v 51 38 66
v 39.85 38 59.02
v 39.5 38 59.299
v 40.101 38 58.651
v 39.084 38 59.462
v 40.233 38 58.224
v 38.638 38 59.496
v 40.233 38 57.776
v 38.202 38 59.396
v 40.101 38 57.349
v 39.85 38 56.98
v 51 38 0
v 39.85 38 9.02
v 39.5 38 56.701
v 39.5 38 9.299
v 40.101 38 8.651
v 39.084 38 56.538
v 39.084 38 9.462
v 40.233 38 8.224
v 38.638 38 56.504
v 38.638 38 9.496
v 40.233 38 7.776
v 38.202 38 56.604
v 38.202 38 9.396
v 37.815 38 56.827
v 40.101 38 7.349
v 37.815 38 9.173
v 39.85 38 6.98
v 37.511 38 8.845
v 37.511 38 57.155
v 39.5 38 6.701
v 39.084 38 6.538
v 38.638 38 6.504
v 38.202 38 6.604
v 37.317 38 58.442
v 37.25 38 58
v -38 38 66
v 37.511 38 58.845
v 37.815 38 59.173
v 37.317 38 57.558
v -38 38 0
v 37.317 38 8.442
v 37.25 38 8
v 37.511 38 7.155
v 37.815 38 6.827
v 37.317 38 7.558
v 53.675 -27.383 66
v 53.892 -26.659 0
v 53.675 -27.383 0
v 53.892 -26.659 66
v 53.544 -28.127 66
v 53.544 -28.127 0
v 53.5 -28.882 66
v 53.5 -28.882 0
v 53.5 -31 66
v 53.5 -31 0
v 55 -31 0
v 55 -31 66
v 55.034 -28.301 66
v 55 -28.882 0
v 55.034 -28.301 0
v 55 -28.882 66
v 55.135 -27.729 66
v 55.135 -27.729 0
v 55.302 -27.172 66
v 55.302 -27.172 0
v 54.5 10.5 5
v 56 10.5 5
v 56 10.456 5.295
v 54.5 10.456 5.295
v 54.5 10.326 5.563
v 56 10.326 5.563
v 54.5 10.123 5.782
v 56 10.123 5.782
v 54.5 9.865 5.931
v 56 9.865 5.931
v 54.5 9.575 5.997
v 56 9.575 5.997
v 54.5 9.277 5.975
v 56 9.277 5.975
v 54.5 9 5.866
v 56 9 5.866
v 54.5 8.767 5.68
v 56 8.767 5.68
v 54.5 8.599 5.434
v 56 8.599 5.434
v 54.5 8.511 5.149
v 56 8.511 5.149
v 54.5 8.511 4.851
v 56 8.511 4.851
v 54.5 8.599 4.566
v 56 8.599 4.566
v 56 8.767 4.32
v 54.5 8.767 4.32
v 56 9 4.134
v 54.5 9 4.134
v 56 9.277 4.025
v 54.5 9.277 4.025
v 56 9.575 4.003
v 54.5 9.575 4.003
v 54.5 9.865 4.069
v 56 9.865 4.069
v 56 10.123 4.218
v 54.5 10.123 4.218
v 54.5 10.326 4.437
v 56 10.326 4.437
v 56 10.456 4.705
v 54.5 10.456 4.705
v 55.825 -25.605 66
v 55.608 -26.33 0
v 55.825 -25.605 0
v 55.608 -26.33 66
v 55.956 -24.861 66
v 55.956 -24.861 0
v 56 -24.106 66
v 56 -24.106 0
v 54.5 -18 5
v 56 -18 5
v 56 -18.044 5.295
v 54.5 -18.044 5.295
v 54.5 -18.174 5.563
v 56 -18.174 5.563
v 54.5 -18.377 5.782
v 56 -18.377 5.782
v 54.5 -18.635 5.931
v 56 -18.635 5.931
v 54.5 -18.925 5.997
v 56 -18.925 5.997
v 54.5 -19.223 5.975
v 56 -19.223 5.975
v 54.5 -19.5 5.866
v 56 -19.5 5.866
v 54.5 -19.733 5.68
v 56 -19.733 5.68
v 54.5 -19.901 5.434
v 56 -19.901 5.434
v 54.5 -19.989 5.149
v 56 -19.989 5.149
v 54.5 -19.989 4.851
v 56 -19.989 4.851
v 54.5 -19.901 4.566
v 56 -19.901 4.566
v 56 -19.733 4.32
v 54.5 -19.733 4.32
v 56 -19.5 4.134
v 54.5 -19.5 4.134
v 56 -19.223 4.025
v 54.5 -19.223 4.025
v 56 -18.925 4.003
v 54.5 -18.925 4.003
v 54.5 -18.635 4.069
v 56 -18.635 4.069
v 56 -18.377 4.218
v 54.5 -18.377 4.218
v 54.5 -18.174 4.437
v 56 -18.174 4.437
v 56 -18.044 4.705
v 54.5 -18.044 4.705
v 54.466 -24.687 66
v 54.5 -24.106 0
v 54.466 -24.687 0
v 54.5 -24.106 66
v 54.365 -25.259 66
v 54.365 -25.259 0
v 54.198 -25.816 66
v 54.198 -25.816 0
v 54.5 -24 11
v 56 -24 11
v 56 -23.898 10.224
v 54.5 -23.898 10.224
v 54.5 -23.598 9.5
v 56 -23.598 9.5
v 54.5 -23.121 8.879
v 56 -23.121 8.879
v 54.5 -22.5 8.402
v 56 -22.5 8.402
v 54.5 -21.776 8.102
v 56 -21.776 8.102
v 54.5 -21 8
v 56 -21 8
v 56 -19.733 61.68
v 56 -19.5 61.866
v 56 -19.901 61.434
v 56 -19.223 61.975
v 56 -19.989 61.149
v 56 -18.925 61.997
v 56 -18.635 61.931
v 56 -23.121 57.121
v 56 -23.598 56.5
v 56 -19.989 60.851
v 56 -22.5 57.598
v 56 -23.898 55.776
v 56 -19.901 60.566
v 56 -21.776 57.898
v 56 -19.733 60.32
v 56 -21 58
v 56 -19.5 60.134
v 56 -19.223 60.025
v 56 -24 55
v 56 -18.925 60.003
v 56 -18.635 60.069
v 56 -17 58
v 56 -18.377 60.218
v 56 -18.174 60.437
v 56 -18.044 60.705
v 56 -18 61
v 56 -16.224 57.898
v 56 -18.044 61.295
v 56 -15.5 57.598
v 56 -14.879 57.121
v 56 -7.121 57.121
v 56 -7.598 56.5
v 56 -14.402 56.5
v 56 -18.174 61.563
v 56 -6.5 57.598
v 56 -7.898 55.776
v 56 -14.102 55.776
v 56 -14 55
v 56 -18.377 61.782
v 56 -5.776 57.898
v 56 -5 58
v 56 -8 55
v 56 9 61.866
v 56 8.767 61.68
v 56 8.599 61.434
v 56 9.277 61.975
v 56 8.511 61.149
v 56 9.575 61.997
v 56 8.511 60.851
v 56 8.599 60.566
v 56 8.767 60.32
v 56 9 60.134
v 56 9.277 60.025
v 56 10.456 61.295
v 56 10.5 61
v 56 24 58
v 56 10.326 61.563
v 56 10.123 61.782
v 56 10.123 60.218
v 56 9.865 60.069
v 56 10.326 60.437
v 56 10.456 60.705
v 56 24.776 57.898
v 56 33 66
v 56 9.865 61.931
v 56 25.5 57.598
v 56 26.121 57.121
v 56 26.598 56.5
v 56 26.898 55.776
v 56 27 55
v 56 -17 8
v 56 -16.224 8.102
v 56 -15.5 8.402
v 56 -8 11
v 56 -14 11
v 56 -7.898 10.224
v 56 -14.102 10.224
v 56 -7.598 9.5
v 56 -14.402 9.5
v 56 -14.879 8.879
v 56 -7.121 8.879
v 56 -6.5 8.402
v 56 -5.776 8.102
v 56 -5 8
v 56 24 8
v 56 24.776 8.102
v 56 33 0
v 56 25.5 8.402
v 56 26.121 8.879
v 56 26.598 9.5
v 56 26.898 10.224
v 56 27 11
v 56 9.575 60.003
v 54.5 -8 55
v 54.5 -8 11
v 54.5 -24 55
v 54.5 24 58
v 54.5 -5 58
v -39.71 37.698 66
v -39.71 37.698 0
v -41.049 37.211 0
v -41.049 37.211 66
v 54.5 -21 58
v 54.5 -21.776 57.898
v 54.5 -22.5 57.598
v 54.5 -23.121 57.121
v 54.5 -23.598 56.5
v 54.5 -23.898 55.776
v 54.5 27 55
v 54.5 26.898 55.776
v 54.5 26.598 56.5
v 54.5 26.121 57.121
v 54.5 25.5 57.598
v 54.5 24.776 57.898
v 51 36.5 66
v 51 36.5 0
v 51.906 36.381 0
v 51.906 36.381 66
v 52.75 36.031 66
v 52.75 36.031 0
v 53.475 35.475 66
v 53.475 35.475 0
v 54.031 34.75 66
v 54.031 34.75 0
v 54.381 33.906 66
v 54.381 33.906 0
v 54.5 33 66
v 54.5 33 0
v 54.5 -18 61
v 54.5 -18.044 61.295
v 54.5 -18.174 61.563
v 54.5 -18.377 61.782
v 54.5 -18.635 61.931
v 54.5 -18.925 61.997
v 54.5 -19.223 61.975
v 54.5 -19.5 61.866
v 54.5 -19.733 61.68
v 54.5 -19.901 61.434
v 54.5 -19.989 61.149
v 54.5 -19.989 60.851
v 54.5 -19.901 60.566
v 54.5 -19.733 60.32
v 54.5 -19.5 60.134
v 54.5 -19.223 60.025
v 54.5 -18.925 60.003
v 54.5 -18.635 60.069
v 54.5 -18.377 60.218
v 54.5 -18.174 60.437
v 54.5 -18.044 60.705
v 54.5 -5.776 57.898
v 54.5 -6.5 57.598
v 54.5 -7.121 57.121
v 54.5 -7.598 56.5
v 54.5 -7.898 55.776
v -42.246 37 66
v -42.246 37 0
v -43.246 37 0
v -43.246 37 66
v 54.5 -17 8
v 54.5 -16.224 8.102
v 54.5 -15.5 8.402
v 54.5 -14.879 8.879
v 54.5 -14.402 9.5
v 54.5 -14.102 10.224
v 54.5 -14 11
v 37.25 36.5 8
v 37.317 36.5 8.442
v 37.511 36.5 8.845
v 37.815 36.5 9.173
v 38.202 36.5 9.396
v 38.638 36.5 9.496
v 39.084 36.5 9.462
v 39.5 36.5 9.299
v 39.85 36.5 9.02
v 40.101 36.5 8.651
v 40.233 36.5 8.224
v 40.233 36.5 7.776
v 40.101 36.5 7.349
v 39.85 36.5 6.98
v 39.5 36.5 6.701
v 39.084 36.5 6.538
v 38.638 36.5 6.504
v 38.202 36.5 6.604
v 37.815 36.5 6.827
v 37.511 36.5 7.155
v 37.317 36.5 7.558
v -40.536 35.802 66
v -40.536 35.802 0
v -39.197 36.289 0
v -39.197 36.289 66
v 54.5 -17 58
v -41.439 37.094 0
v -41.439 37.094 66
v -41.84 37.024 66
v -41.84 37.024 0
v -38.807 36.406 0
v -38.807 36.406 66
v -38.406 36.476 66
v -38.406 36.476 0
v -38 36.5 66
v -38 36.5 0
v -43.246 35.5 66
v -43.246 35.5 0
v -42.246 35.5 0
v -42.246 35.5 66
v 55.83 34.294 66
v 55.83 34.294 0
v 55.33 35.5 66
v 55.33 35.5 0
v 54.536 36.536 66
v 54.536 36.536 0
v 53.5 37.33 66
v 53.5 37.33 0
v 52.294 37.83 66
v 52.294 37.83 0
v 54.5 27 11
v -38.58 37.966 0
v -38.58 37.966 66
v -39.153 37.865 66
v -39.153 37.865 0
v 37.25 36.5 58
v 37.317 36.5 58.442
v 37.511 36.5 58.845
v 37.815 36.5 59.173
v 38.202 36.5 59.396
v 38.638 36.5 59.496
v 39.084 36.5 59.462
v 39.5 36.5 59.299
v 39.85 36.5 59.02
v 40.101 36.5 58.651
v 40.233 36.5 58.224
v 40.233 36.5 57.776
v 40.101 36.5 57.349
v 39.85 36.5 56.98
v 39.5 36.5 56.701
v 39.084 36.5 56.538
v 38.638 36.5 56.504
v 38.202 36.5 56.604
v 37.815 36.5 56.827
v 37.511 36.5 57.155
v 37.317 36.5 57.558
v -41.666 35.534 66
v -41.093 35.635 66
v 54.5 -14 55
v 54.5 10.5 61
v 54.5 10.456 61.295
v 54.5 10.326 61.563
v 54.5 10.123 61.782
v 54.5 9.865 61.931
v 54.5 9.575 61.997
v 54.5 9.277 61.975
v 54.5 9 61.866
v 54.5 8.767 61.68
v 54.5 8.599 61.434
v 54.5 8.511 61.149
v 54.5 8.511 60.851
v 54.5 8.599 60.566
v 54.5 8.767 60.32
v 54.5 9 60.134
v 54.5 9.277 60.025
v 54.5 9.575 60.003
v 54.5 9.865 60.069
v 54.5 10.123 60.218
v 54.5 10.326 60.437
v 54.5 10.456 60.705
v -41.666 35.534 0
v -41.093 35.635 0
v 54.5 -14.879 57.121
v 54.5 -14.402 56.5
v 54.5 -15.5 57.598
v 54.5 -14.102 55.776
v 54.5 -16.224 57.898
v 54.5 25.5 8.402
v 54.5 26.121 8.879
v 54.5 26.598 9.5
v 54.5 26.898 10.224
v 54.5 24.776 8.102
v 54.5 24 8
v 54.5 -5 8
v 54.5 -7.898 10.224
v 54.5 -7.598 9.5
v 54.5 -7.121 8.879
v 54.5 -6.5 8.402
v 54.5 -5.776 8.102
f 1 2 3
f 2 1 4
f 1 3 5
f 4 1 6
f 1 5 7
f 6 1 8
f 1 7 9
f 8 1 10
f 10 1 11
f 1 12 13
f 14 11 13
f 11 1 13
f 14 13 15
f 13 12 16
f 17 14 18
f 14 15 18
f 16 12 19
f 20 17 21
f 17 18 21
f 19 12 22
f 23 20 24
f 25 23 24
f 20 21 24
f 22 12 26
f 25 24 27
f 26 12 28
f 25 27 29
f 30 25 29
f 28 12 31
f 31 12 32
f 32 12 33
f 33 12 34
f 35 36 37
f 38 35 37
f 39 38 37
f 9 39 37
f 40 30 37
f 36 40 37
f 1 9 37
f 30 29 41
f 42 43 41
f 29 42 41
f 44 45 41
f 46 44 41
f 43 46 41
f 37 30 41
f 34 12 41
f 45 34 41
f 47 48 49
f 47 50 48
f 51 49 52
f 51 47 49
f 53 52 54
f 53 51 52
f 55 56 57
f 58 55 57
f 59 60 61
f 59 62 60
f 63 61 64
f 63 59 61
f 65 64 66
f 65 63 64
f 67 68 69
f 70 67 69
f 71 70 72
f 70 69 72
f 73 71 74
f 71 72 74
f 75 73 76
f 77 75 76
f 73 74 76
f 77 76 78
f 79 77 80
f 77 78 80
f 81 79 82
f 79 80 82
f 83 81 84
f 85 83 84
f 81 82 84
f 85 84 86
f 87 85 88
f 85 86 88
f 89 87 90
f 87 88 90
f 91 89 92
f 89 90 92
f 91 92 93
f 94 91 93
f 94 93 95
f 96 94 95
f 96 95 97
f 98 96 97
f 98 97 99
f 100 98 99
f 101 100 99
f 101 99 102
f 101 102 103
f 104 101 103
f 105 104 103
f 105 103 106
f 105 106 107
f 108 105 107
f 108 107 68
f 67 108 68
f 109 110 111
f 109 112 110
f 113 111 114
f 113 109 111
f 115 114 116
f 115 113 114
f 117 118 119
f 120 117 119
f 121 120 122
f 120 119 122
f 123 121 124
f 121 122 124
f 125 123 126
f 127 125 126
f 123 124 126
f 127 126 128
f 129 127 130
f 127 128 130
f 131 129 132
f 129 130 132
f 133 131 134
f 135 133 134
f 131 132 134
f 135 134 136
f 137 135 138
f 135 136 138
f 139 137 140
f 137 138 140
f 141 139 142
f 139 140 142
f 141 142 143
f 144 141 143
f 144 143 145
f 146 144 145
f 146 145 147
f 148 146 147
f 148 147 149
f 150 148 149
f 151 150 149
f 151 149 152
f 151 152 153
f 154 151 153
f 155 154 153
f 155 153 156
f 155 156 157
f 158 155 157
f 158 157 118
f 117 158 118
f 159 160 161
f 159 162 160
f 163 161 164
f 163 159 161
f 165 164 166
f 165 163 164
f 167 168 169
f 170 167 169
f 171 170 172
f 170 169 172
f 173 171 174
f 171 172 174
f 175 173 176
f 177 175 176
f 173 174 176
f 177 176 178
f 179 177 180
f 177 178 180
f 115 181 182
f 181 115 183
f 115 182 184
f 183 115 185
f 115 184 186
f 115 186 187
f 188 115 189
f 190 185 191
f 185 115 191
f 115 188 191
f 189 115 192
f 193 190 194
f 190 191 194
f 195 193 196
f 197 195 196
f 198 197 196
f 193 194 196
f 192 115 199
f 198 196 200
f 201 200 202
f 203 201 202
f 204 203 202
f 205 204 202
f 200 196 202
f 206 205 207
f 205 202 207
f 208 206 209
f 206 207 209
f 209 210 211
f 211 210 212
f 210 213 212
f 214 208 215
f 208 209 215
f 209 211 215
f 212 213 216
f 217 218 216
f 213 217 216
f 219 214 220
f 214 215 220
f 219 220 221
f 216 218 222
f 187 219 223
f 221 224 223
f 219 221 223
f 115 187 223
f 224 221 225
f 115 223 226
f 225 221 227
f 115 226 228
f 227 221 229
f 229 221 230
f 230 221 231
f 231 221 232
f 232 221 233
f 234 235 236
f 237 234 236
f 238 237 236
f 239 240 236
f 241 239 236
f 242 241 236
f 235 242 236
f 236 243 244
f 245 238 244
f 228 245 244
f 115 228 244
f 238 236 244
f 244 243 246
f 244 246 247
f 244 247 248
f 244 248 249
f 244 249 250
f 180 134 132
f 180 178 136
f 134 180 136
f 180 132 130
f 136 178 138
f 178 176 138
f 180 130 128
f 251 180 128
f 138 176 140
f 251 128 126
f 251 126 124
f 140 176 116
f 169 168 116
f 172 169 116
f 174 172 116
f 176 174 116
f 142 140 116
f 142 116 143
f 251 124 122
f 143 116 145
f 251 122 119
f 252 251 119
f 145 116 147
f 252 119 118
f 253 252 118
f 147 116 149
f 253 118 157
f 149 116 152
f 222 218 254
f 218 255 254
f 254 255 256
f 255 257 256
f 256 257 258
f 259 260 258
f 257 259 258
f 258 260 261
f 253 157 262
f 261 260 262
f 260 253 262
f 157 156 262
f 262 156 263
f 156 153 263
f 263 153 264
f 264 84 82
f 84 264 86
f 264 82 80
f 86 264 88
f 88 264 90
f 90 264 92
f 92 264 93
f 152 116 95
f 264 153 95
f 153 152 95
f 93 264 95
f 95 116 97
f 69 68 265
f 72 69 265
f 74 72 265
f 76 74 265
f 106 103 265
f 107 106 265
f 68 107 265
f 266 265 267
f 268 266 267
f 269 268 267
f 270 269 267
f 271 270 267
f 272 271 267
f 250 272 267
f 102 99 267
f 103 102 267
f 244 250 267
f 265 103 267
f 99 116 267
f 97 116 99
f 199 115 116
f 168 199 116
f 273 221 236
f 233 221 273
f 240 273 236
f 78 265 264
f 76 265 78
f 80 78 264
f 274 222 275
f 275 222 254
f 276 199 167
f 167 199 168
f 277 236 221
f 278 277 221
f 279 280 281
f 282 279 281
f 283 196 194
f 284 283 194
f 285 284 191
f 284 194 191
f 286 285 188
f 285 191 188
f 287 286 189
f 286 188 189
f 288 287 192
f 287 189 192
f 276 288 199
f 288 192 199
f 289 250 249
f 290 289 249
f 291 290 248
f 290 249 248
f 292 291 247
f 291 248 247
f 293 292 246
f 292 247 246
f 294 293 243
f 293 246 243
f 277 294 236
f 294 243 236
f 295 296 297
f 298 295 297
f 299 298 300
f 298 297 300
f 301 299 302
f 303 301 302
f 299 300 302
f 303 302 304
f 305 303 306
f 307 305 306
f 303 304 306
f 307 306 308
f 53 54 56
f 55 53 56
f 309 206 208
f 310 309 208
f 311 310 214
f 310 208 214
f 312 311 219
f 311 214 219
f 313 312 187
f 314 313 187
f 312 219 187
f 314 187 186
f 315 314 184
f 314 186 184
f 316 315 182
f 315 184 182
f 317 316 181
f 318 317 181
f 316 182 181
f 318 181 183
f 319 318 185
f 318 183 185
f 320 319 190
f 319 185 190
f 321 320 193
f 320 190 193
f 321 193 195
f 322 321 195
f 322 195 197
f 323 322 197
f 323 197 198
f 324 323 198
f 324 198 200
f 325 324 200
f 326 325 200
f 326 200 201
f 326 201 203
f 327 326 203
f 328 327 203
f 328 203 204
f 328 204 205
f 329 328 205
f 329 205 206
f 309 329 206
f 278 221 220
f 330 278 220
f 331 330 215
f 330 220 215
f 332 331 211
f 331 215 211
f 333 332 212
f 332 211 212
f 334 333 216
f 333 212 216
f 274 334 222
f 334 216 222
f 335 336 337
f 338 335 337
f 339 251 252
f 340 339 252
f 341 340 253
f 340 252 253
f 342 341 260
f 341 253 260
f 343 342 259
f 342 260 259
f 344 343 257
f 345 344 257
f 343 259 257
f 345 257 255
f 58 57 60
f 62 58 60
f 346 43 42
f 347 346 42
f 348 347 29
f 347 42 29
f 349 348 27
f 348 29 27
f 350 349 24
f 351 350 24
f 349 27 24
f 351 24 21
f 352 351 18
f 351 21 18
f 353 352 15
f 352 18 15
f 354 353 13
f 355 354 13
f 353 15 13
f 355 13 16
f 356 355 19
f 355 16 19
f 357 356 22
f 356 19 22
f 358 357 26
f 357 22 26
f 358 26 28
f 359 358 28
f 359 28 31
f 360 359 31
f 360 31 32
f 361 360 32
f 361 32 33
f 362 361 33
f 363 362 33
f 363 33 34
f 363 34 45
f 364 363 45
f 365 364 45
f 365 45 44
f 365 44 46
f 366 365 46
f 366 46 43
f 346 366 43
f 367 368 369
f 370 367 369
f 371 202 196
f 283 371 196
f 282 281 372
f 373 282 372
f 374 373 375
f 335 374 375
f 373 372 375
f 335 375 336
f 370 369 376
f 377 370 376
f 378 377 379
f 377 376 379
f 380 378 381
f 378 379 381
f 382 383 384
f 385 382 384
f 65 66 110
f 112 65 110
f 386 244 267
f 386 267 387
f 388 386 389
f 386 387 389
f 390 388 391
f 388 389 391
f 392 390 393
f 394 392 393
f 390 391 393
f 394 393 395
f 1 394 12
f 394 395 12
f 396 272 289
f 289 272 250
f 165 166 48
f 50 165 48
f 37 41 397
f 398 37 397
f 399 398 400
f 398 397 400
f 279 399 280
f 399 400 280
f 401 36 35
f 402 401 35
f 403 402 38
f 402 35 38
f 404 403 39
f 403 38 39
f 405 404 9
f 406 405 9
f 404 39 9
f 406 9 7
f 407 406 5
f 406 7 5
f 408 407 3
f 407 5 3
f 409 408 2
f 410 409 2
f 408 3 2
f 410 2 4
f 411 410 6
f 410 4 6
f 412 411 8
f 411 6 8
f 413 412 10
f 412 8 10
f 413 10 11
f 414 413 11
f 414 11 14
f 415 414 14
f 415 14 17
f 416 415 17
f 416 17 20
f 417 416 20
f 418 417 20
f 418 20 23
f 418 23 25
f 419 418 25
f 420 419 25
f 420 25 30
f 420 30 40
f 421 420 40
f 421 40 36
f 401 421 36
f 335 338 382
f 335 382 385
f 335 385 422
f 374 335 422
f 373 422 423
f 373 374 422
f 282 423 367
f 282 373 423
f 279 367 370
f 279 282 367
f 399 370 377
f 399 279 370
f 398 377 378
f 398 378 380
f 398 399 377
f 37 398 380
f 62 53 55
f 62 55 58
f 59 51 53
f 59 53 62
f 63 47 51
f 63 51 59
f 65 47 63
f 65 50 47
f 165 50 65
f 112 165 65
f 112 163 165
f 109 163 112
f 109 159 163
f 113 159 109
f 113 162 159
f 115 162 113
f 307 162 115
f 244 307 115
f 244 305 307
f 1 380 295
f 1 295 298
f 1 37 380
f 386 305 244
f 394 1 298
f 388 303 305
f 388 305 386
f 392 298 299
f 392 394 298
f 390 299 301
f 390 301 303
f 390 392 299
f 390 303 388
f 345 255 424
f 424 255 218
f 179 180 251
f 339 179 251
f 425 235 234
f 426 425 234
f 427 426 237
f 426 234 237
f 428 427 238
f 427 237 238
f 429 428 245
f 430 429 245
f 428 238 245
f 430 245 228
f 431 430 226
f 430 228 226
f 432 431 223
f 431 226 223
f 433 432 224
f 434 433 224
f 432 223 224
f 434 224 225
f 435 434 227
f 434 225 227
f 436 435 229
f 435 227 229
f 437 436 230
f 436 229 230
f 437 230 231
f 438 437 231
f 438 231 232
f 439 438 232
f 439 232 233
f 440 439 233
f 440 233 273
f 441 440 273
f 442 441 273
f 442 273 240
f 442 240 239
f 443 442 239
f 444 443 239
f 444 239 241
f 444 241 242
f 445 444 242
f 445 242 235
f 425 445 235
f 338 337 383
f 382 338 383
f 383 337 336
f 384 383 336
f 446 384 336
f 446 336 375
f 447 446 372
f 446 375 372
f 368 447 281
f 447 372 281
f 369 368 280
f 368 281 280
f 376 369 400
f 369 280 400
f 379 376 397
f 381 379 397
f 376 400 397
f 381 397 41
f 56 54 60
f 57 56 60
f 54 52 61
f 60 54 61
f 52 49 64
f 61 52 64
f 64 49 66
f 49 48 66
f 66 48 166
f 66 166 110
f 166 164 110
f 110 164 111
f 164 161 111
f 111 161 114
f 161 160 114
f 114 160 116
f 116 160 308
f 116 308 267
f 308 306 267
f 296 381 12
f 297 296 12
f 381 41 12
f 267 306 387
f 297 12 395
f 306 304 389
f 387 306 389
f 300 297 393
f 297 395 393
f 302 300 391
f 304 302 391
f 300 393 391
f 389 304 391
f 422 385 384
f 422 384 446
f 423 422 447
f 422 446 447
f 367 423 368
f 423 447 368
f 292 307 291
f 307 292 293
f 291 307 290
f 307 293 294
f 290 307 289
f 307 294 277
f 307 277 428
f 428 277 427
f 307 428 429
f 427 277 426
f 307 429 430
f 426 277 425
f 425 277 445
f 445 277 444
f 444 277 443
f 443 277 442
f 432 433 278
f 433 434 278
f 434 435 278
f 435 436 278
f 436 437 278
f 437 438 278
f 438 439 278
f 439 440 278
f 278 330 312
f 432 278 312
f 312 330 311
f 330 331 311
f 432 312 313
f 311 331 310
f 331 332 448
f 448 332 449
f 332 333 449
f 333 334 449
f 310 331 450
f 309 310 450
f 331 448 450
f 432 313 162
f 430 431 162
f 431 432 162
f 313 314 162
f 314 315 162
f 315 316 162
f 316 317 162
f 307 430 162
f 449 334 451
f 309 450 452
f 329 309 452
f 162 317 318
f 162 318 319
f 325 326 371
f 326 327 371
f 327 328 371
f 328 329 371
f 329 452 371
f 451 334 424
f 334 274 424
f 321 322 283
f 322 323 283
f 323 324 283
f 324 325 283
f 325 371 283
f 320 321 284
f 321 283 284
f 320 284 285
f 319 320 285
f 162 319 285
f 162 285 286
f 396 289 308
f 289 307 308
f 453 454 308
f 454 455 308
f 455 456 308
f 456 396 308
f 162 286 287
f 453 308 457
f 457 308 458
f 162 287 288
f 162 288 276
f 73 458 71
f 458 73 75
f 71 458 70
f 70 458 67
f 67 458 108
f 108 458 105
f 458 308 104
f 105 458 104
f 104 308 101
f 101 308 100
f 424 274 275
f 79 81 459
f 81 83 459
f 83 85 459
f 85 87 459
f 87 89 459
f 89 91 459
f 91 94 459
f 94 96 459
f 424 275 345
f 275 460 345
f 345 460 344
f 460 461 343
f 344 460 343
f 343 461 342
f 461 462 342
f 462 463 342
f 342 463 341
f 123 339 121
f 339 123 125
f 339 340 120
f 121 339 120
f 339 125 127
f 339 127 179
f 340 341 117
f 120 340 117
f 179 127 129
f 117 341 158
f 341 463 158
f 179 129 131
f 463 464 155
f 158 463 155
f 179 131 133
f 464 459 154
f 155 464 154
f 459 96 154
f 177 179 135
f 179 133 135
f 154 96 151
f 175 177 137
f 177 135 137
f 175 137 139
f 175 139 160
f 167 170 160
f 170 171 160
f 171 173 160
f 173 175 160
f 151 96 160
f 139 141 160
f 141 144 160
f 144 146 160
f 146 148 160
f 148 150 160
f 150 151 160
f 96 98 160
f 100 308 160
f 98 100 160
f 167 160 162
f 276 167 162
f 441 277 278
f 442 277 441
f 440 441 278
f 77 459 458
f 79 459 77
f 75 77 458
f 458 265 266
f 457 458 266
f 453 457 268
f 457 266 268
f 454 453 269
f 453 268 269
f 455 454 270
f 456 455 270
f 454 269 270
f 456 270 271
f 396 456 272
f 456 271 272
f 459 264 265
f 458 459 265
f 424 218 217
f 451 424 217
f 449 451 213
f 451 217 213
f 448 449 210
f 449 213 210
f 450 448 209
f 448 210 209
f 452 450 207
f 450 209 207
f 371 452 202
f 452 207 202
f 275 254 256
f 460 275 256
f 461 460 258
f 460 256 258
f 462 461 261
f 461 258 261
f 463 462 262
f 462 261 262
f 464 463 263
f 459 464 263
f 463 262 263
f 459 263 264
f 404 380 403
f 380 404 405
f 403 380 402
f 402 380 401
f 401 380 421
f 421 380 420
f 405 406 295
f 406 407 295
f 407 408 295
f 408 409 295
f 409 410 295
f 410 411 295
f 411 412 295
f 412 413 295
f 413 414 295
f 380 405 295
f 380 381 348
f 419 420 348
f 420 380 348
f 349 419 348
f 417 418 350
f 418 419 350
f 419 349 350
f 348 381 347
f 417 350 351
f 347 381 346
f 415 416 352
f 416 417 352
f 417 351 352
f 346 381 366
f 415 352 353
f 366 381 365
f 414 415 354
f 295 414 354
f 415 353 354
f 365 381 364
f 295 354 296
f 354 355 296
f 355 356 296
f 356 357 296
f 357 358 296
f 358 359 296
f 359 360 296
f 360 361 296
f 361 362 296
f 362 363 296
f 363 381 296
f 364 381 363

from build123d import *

# Parameters (mm, degrees)
F1_DEPTH  = 66
F2_R      = 1.5
F3_DEPTH  = 25
F4_R      = 1
F5_DEPTH  = 25
F6_R      = 5
F7_R      = 6.5
F8_W      = 11.5
F8_H      = 48
F9_DEPTH  = 100
F11_DEPTH = 66


# Not quite as in the source:
# - a feature names something its author has since deleted; it is built from what else it names


with BuildPart() as f1:
    # F0 (on Top) → F1 (new body)
    with BuildSketch(Plane.XY):
        with BuildLine():
            Line((54.5, 33), (54.5, -24.9880321095))
            Line((54.5, -24.9880321095), (53.5, -27.7355095289))
            Line((53.5, -27.7355095289), (53.5, -31))
            Line((53.5, -31), (55, -31))
            Line((55, -31), (55, -28))
            Line((55, -28), (56, -25.2525225805))
            Line((56, -25.2525225805), (56, 33))
            ThreePointArc((56, 33), (54.5355339059, 36.5355339059), (51, 38))
            Line((51, 38), (-42.5, 38))
            ThreePointArc((-42.5, 38), (-46.0355339059, 36.5355339059), (-47.5, 33))
            Line((-47.5, 33), (-47.5, 0))
            Line((-47.5, 0), (-46.000000001, 0))
            Line((-46.000000001, 0), (-46.000000001, 33))
            ThreePointArc((-46.000000001, 33), (-44.9748737349, 35.4748737349), (-42.5, 36.500000001))
            Line((-42.5, 36.5), (51, 36.5))
            ThreePointArc((51, 36.5), (53.4748737342, 35.4748737342), (54.5, 33))
        make_face()
    extrude(amount=F1_DEPTH)

    # F2 (on face) → F3 (cut)
    with BuildSketch(Plane(origin=(0, 38, 0), x_dir=(-1, 0, 0), z_dir=(0, 1, 0))):
        with Locations((-38.75, 58)):
            Circle(F2_R)
        with Locations((-38.75, 8)):
            Circle(F2_R)
    extrude(amount=-F3_DEPTH, mode=Mode.SUBTRACT)

    # F4 (on face) → F5 (cut)
    with BuildSketch(Plane.YZ.offset(56)):
        with BuildLine():
            Line((-17, 58), (-21, 58))
            ThreePointArc((-21, 58), (-23.1213203436, 57.1213203436), (-24, 55))
            Line((-24, 55), (-24, 11))
            ThreePointArc((-24, 11), (-23.1213203436, 8.8786796564), (-21, 8))
            Line((-21, 8), (-17, 8))
            ThreePointArc((-17, 8), (-14.8786796564, 8.8786796564), (-14, 11))
            Line((-14, 11), (-14, 55))
            ThreePointArc((-14, 55), (-14.8786796564, 57.1213203436), (-17, 58))
        make_face()
        with BuildLine():
            Line((24, 58), (-5, 58))
            ThreePointArc((-5, 58), (-7.1213203436, 57.1213203436), (-8, 55))
            Line((-8, 55), (-8, 11))
            ThreePointArc((-8, 11), (-7.1213203436, 8.8786796564), (-5, 8))
            Line((-5, 8), (24, 8))
            ThreePointArc((24, 8), (26.1213203436, 8.8786796564), (27, 11))
            Line((27, 11), (27, 55))
            ThreePointArc((27, 55), (26.1213203436, 57.1213203436), (24, 58))
        make_face()
        with Locations((-19, 61)):
            Circle(F4_R)
        with Locations((9.5, 61)):
            Circle(F4_R)
        with Locations((9.5, 5)):
            Circle(F4_R)
        with Locations((-19, 5)):
            Circle(F4_R)
    extrude(amount=-F5_DEPTH, mode=Mode.SUBTRACT)

    # F6
    f6_edges = [f1.edges().sort_by_distance(p)[0] for p in [
        (55, -28, 33),
        (54.5, -24.988032, 33),
    ]]
    fillet(f6_edges, radius=F6_R)

    # F7
    f7_edges = [f1.edges().sort_by_distance(p)[0] for p in [
        (56, -25.252523, 33),
        (53.5, -27.73551, 33),
    ]]
    fillet(f7_edges, radius=F7_R)

    # F8 (on Top) → F9 (cut)
    with BuildSketch(Plane.XY):
        with Locations((-43.75, 19)):
            Rectangle(F8_W, F8_H)
    extrude(amount=F9_DEPTH, mode=Mode.SUBTRACT)

    # F10 (on Top) → F11 (join)
    with BuildSketch(Plane.XY):
        with BuildLine():
            Line((-43.2462567555, 37), (-43.2462567555, 35.5))
            Line((-43.2462567555, 35.5), (-42.2462567555, 35.5))
            ThreePointArc((-42.2462567555, 35.5), (-41.3780158671, 35.5759612349), (-40.5361560388, 35.8015368961))
            Line((-40.5361560388, 35.8015368961), (-39.1970705016, 36.2889241728))
            ThreePointArc((-39.1970705016, 36.2889241728), (-38.6077686218, 36.4468271355), (-38, 36.5))
            Line((-38, 36.5), (-38, 38))
            ThreePointArc((-38, 38), (-38.8682408883, 37.9240387651), (-39.7101007166, 37.6984631039))
            Line((-39.7101007166, 37.6984631039), (-41.0491862538, 37.2110758272))
            ThreePointArc((-41.0491862538, 37.2110758272), (-41.6384881336, 37.0531728645), (-42.2462567555, 37))
            Line((-42.2462567555, 37), (-43.2462567555, 37))
        make_face()
    extrude(amount=F11_DEPTH)


solid = f1.part
